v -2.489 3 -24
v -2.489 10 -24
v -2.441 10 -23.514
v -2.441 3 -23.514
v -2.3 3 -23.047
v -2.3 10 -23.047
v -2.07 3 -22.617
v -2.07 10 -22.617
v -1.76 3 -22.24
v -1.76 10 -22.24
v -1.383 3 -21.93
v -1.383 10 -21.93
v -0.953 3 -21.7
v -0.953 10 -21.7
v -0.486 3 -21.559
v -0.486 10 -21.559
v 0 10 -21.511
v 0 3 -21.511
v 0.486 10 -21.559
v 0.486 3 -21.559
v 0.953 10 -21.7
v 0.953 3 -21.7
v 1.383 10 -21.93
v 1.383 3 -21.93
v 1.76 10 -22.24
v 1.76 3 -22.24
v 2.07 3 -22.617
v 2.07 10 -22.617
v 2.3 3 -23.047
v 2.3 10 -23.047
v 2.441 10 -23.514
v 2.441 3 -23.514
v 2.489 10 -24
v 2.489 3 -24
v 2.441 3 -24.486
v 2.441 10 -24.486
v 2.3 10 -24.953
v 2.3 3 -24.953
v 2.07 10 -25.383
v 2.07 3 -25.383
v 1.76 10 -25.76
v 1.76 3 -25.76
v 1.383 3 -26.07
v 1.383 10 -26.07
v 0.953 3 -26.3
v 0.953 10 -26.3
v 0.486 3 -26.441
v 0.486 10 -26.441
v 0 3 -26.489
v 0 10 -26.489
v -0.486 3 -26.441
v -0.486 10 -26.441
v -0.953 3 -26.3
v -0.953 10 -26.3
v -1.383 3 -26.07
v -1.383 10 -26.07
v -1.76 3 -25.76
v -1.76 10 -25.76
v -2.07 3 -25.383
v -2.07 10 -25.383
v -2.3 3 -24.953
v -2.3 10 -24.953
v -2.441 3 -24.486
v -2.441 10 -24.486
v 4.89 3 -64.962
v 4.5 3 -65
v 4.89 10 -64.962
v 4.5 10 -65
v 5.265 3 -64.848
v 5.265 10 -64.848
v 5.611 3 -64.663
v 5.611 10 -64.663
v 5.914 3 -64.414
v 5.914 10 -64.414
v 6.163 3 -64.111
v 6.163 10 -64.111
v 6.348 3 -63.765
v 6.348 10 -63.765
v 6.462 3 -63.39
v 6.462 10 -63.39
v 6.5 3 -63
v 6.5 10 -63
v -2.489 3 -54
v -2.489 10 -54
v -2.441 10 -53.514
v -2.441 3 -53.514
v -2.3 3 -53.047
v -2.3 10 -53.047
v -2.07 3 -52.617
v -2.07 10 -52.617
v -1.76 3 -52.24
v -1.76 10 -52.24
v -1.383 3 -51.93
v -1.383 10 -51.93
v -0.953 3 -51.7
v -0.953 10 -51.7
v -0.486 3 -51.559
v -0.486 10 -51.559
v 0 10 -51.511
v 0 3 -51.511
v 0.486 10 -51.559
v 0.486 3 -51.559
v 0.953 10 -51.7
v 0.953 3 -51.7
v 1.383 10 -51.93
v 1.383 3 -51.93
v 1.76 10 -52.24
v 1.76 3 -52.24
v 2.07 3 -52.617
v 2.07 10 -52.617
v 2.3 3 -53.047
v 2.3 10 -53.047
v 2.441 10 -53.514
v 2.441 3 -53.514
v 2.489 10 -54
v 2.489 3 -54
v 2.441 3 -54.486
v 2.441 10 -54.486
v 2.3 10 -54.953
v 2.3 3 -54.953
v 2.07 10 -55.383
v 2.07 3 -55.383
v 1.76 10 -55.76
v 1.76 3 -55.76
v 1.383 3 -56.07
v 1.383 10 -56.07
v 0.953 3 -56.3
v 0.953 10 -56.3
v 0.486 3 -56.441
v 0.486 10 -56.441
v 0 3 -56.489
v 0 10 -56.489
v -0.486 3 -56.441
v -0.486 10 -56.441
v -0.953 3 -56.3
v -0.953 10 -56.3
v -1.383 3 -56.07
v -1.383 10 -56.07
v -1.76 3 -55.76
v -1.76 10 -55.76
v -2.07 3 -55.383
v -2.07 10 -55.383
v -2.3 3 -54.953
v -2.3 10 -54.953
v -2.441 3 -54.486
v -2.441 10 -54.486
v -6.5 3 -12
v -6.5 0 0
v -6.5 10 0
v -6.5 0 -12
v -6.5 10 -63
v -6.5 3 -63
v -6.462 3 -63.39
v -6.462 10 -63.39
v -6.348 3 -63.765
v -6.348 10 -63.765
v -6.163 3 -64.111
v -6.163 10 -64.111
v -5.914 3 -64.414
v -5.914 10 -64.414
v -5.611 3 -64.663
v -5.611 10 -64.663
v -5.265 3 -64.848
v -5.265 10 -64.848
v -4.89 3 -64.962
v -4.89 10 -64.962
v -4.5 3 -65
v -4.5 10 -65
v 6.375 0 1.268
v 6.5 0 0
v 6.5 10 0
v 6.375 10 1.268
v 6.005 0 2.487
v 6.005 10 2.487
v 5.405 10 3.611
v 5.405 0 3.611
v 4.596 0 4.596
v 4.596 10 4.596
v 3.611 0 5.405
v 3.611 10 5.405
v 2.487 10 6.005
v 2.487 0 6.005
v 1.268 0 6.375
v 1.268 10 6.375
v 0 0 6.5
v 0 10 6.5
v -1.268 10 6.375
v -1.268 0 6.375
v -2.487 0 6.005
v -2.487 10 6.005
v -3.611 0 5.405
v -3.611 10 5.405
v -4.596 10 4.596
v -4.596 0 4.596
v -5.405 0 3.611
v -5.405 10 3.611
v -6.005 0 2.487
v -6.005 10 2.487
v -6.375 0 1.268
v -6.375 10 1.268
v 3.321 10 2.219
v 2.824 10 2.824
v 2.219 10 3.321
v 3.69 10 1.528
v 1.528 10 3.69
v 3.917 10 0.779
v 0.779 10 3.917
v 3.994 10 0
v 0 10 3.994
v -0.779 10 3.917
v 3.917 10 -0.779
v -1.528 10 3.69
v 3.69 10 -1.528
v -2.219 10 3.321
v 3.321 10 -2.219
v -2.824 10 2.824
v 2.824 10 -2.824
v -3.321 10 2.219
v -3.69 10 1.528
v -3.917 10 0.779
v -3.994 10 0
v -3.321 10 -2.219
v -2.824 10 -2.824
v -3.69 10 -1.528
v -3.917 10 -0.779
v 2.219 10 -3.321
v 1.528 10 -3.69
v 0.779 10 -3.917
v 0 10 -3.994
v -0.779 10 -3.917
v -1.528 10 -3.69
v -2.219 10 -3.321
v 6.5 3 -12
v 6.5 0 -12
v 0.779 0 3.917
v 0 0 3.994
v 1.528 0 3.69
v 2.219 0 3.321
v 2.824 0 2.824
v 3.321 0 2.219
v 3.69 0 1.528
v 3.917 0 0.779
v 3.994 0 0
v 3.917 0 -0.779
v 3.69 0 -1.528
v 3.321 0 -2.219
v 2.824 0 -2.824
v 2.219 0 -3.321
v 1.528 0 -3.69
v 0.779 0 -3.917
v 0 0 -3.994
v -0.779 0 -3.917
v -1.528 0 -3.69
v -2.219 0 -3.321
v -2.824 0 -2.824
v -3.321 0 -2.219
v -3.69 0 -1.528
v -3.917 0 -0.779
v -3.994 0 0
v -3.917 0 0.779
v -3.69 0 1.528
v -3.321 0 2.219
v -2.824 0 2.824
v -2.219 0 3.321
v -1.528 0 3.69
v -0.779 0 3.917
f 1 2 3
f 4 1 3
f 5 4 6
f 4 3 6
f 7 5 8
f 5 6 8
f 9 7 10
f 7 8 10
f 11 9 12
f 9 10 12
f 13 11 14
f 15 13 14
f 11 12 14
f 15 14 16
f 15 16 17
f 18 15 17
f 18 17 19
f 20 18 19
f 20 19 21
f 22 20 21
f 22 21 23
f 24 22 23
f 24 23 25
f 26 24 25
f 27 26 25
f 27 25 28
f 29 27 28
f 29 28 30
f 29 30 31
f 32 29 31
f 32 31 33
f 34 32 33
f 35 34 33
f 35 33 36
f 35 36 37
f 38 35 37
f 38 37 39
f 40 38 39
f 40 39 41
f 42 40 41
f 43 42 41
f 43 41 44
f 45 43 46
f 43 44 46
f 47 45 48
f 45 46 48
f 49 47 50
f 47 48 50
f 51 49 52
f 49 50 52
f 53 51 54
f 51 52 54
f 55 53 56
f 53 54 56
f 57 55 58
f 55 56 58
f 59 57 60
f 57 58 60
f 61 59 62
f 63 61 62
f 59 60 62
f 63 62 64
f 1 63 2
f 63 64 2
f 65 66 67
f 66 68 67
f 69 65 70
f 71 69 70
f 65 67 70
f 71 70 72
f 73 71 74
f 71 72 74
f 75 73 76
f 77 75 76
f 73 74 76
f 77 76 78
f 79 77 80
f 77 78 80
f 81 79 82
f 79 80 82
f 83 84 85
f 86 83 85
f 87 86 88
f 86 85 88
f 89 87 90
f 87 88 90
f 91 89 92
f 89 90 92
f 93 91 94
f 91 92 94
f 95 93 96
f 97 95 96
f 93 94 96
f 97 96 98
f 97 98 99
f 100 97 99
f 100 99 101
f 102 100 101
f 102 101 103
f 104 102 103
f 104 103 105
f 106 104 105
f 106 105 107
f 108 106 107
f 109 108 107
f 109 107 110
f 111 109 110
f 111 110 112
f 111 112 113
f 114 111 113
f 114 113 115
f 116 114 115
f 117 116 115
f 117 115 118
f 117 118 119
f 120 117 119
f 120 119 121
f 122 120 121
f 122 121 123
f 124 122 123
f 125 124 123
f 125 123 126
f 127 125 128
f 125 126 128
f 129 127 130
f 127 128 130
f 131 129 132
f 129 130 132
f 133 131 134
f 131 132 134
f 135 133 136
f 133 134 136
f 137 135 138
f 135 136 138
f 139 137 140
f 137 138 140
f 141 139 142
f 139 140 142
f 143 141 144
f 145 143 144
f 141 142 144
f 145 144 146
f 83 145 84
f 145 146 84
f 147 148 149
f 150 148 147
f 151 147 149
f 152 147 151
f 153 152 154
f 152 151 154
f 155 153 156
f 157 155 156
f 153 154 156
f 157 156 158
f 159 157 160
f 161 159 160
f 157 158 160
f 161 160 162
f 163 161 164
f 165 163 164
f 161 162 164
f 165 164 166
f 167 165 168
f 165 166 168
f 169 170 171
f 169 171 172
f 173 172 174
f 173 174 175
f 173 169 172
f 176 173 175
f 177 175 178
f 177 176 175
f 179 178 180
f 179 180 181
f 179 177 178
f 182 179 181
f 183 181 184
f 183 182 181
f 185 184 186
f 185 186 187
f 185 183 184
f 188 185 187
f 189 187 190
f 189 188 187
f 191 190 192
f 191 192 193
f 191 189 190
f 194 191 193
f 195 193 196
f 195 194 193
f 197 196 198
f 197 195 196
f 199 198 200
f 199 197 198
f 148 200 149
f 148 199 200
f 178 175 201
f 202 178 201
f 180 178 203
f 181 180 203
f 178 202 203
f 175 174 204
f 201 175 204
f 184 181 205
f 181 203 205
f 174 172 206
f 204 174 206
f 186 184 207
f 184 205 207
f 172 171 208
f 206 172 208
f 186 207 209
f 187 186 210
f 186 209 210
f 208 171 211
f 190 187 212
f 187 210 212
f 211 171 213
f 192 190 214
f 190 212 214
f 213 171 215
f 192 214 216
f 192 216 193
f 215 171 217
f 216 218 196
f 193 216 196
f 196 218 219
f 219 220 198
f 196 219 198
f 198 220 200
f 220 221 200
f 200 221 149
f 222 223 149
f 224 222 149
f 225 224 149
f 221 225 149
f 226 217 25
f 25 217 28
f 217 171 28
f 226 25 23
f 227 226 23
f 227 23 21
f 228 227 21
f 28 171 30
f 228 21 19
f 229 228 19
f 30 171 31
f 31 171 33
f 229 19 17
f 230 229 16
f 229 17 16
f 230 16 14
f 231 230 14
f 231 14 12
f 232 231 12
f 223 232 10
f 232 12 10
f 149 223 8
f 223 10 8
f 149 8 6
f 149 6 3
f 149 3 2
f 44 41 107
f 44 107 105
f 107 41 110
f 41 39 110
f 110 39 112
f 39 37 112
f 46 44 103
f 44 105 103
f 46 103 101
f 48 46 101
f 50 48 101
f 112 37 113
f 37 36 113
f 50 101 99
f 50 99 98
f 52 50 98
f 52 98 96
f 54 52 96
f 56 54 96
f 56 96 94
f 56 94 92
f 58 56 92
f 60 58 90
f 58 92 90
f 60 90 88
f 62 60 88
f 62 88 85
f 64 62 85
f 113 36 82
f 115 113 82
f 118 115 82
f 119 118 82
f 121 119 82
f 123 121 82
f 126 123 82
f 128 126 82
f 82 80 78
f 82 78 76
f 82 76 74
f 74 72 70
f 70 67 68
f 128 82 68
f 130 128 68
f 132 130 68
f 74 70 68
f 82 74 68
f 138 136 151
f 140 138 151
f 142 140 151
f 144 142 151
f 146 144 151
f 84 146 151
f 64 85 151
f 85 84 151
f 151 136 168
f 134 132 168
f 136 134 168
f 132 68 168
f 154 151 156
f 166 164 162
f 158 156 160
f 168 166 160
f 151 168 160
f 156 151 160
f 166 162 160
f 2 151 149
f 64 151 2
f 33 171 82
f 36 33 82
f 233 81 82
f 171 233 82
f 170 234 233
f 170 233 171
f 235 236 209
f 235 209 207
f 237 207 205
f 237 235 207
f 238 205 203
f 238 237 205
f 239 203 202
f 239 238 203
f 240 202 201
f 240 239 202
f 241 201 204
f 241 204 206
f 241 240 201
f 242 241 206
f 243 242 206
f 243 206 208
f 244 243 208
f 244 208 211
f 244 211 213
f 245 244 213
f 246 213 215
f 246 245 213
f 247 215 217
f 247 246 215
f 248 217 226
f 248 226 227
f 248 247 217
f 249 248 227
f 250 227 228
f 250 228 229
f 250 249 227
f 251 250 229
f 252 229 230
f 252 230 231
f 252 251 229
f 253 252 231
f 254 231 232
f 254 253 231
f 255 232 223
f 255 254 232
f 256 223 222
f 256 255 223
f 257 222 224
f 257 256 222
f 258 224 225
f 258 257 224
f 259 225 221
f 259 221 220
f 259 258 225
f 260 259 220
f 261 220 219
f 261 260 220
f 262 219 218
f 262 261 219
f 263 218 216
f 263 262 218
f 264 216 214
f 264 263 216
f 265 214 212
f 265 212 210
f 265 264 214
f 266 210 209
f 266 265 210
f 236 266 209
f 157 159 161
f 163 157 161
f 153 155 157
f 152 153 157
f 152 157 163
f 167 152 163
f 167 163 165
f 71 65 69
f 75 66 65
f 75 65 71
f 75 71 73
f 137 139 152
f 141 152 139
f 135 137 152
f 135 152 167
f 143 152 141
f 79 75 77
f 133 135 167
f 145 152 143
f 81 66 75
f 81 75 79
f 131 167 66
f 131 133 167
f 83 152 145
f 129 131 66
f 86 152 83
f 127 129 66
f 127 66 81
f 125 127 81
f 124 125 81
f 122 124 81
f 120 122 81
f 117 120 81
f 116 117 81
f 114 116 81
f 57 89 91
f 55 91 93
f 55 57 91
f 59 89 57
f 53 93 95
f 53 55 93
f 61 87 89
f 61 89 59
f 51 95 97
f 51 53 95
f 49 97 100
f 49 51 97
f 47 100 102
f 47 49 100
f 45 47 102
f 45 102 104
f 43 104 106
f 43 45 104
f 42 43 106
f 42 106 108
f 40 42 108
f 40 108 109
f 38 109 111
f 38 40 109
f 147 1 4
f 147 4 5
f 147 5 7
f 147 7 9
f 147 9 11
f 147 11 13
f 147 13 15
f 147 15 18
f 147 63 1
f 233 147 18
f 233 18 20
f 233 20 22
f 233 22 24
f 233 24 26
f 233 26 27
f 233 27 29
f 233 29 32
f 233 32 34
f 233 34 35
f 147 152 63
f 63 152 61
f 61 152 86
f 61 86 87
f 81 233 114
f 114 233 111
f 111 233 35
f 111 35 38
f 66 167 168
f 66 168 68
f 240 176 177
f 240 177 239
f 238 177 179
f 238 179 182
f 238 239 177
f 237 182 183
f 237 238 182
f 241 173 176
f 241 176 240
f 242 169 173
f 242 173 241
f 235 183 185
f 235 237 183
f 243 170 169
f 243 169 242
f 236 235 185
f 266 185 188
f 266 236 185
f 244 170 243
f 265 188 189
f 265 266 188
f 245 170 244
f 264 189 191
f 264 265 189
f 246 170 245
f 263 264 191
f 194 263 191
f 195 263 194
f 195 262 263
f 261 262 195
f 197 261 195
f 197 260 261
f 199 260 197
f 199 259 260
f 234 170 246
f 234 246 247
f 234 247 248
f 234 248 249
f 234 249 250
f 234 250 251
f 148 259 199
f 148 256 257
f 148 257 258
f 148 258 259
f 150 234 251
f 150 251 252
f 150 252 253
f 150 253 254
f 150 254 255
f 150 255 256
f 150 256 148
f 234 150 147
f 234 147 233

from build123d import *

# Parameters (mm, degrees)
SKETCH1_R                  = 3.99415
BOSS_EXTRUDE1_DEPTH        = 10
SKETCH2_W                  = 13
SKETCH2_H                  = 53
CUT_EXTRUDE1_DEPTH         = 3
F_10_CLEARANCE_HOLE1_D     = 4.9784
F_10_CLEARANCE_HOLE1_DEPTH = 40
F_10_CLEARANCE_HOLE1_TIP   = 1.495662253
FILLET1_R                  = 2


with BuildPart() as part:
    # Sketch1 → Boss-Extrude1 (new body)
    with BuildSketch(Plane(origin=(0, 0, 0), x_dir=(1, 0, 0), z_dir=(0, 1, 0))):
        with BuildLine():
            Line((-6.5, 0), (-6.5, 65))
            Line((-6.5, 65), (6.5, 65))
            Line((6.5, 65), (6.5, 0))
            ThreePointArc((6.5, 0), (0, -6.5), (-6.5, 0))
        make_face()
        with Locations(Location((0, 0, 0), (0, 0, 270))):  # turned: the seam where the file's is
            Circle(SKETCH1_R, mode=Mode.SUBTRACT)
    extrude(amount=BOSS_EXTRUDE1_DEPTH)

    # Sketch2 → Cut-Extrude1 (cut)
    with BuildSketch(Plane.XZ):
        with Locations((0, -38.5)):
            Rectangle(SKETCH2_W, SKETCH2_H)
    extrude(amount=-CUT_EXTRUDE1_DEPTH, mode=Mode.SUBTRACT)

    # #10 Clearance Hole1
    with Locations(Plane.XZ.offset(-3)):
        with Locations((0, -54), (0, -24)):
            Hole(F_10_CLEARANCE_HOLE1_D / 2, depth=F_10_CLEARANCE_HOLE1_DEPTH)
            with Locations((0, 0, -(F_10_CLEARANCE_HOLE1_DEPTH + F_10_CLEARANCE_HOLE1_TIP / 2))):  # 118° drill point
                Cone(0, F_10_CLEARANCE_HOLE1_D / 2, F_10_CLEARANCE_HOLE1_TIP, mode=Mode.SUBTRACT)

    # Fillet1
    fillet1_edges = [part.edges().sort_by_distance(p)[0] for p in [
        (-6.5, 6.5, -65),
        (6.5, 6.5, -65),
    ]]
    fillet(fillet1_edges, radius=FILLET1_R)


solid = part.part
